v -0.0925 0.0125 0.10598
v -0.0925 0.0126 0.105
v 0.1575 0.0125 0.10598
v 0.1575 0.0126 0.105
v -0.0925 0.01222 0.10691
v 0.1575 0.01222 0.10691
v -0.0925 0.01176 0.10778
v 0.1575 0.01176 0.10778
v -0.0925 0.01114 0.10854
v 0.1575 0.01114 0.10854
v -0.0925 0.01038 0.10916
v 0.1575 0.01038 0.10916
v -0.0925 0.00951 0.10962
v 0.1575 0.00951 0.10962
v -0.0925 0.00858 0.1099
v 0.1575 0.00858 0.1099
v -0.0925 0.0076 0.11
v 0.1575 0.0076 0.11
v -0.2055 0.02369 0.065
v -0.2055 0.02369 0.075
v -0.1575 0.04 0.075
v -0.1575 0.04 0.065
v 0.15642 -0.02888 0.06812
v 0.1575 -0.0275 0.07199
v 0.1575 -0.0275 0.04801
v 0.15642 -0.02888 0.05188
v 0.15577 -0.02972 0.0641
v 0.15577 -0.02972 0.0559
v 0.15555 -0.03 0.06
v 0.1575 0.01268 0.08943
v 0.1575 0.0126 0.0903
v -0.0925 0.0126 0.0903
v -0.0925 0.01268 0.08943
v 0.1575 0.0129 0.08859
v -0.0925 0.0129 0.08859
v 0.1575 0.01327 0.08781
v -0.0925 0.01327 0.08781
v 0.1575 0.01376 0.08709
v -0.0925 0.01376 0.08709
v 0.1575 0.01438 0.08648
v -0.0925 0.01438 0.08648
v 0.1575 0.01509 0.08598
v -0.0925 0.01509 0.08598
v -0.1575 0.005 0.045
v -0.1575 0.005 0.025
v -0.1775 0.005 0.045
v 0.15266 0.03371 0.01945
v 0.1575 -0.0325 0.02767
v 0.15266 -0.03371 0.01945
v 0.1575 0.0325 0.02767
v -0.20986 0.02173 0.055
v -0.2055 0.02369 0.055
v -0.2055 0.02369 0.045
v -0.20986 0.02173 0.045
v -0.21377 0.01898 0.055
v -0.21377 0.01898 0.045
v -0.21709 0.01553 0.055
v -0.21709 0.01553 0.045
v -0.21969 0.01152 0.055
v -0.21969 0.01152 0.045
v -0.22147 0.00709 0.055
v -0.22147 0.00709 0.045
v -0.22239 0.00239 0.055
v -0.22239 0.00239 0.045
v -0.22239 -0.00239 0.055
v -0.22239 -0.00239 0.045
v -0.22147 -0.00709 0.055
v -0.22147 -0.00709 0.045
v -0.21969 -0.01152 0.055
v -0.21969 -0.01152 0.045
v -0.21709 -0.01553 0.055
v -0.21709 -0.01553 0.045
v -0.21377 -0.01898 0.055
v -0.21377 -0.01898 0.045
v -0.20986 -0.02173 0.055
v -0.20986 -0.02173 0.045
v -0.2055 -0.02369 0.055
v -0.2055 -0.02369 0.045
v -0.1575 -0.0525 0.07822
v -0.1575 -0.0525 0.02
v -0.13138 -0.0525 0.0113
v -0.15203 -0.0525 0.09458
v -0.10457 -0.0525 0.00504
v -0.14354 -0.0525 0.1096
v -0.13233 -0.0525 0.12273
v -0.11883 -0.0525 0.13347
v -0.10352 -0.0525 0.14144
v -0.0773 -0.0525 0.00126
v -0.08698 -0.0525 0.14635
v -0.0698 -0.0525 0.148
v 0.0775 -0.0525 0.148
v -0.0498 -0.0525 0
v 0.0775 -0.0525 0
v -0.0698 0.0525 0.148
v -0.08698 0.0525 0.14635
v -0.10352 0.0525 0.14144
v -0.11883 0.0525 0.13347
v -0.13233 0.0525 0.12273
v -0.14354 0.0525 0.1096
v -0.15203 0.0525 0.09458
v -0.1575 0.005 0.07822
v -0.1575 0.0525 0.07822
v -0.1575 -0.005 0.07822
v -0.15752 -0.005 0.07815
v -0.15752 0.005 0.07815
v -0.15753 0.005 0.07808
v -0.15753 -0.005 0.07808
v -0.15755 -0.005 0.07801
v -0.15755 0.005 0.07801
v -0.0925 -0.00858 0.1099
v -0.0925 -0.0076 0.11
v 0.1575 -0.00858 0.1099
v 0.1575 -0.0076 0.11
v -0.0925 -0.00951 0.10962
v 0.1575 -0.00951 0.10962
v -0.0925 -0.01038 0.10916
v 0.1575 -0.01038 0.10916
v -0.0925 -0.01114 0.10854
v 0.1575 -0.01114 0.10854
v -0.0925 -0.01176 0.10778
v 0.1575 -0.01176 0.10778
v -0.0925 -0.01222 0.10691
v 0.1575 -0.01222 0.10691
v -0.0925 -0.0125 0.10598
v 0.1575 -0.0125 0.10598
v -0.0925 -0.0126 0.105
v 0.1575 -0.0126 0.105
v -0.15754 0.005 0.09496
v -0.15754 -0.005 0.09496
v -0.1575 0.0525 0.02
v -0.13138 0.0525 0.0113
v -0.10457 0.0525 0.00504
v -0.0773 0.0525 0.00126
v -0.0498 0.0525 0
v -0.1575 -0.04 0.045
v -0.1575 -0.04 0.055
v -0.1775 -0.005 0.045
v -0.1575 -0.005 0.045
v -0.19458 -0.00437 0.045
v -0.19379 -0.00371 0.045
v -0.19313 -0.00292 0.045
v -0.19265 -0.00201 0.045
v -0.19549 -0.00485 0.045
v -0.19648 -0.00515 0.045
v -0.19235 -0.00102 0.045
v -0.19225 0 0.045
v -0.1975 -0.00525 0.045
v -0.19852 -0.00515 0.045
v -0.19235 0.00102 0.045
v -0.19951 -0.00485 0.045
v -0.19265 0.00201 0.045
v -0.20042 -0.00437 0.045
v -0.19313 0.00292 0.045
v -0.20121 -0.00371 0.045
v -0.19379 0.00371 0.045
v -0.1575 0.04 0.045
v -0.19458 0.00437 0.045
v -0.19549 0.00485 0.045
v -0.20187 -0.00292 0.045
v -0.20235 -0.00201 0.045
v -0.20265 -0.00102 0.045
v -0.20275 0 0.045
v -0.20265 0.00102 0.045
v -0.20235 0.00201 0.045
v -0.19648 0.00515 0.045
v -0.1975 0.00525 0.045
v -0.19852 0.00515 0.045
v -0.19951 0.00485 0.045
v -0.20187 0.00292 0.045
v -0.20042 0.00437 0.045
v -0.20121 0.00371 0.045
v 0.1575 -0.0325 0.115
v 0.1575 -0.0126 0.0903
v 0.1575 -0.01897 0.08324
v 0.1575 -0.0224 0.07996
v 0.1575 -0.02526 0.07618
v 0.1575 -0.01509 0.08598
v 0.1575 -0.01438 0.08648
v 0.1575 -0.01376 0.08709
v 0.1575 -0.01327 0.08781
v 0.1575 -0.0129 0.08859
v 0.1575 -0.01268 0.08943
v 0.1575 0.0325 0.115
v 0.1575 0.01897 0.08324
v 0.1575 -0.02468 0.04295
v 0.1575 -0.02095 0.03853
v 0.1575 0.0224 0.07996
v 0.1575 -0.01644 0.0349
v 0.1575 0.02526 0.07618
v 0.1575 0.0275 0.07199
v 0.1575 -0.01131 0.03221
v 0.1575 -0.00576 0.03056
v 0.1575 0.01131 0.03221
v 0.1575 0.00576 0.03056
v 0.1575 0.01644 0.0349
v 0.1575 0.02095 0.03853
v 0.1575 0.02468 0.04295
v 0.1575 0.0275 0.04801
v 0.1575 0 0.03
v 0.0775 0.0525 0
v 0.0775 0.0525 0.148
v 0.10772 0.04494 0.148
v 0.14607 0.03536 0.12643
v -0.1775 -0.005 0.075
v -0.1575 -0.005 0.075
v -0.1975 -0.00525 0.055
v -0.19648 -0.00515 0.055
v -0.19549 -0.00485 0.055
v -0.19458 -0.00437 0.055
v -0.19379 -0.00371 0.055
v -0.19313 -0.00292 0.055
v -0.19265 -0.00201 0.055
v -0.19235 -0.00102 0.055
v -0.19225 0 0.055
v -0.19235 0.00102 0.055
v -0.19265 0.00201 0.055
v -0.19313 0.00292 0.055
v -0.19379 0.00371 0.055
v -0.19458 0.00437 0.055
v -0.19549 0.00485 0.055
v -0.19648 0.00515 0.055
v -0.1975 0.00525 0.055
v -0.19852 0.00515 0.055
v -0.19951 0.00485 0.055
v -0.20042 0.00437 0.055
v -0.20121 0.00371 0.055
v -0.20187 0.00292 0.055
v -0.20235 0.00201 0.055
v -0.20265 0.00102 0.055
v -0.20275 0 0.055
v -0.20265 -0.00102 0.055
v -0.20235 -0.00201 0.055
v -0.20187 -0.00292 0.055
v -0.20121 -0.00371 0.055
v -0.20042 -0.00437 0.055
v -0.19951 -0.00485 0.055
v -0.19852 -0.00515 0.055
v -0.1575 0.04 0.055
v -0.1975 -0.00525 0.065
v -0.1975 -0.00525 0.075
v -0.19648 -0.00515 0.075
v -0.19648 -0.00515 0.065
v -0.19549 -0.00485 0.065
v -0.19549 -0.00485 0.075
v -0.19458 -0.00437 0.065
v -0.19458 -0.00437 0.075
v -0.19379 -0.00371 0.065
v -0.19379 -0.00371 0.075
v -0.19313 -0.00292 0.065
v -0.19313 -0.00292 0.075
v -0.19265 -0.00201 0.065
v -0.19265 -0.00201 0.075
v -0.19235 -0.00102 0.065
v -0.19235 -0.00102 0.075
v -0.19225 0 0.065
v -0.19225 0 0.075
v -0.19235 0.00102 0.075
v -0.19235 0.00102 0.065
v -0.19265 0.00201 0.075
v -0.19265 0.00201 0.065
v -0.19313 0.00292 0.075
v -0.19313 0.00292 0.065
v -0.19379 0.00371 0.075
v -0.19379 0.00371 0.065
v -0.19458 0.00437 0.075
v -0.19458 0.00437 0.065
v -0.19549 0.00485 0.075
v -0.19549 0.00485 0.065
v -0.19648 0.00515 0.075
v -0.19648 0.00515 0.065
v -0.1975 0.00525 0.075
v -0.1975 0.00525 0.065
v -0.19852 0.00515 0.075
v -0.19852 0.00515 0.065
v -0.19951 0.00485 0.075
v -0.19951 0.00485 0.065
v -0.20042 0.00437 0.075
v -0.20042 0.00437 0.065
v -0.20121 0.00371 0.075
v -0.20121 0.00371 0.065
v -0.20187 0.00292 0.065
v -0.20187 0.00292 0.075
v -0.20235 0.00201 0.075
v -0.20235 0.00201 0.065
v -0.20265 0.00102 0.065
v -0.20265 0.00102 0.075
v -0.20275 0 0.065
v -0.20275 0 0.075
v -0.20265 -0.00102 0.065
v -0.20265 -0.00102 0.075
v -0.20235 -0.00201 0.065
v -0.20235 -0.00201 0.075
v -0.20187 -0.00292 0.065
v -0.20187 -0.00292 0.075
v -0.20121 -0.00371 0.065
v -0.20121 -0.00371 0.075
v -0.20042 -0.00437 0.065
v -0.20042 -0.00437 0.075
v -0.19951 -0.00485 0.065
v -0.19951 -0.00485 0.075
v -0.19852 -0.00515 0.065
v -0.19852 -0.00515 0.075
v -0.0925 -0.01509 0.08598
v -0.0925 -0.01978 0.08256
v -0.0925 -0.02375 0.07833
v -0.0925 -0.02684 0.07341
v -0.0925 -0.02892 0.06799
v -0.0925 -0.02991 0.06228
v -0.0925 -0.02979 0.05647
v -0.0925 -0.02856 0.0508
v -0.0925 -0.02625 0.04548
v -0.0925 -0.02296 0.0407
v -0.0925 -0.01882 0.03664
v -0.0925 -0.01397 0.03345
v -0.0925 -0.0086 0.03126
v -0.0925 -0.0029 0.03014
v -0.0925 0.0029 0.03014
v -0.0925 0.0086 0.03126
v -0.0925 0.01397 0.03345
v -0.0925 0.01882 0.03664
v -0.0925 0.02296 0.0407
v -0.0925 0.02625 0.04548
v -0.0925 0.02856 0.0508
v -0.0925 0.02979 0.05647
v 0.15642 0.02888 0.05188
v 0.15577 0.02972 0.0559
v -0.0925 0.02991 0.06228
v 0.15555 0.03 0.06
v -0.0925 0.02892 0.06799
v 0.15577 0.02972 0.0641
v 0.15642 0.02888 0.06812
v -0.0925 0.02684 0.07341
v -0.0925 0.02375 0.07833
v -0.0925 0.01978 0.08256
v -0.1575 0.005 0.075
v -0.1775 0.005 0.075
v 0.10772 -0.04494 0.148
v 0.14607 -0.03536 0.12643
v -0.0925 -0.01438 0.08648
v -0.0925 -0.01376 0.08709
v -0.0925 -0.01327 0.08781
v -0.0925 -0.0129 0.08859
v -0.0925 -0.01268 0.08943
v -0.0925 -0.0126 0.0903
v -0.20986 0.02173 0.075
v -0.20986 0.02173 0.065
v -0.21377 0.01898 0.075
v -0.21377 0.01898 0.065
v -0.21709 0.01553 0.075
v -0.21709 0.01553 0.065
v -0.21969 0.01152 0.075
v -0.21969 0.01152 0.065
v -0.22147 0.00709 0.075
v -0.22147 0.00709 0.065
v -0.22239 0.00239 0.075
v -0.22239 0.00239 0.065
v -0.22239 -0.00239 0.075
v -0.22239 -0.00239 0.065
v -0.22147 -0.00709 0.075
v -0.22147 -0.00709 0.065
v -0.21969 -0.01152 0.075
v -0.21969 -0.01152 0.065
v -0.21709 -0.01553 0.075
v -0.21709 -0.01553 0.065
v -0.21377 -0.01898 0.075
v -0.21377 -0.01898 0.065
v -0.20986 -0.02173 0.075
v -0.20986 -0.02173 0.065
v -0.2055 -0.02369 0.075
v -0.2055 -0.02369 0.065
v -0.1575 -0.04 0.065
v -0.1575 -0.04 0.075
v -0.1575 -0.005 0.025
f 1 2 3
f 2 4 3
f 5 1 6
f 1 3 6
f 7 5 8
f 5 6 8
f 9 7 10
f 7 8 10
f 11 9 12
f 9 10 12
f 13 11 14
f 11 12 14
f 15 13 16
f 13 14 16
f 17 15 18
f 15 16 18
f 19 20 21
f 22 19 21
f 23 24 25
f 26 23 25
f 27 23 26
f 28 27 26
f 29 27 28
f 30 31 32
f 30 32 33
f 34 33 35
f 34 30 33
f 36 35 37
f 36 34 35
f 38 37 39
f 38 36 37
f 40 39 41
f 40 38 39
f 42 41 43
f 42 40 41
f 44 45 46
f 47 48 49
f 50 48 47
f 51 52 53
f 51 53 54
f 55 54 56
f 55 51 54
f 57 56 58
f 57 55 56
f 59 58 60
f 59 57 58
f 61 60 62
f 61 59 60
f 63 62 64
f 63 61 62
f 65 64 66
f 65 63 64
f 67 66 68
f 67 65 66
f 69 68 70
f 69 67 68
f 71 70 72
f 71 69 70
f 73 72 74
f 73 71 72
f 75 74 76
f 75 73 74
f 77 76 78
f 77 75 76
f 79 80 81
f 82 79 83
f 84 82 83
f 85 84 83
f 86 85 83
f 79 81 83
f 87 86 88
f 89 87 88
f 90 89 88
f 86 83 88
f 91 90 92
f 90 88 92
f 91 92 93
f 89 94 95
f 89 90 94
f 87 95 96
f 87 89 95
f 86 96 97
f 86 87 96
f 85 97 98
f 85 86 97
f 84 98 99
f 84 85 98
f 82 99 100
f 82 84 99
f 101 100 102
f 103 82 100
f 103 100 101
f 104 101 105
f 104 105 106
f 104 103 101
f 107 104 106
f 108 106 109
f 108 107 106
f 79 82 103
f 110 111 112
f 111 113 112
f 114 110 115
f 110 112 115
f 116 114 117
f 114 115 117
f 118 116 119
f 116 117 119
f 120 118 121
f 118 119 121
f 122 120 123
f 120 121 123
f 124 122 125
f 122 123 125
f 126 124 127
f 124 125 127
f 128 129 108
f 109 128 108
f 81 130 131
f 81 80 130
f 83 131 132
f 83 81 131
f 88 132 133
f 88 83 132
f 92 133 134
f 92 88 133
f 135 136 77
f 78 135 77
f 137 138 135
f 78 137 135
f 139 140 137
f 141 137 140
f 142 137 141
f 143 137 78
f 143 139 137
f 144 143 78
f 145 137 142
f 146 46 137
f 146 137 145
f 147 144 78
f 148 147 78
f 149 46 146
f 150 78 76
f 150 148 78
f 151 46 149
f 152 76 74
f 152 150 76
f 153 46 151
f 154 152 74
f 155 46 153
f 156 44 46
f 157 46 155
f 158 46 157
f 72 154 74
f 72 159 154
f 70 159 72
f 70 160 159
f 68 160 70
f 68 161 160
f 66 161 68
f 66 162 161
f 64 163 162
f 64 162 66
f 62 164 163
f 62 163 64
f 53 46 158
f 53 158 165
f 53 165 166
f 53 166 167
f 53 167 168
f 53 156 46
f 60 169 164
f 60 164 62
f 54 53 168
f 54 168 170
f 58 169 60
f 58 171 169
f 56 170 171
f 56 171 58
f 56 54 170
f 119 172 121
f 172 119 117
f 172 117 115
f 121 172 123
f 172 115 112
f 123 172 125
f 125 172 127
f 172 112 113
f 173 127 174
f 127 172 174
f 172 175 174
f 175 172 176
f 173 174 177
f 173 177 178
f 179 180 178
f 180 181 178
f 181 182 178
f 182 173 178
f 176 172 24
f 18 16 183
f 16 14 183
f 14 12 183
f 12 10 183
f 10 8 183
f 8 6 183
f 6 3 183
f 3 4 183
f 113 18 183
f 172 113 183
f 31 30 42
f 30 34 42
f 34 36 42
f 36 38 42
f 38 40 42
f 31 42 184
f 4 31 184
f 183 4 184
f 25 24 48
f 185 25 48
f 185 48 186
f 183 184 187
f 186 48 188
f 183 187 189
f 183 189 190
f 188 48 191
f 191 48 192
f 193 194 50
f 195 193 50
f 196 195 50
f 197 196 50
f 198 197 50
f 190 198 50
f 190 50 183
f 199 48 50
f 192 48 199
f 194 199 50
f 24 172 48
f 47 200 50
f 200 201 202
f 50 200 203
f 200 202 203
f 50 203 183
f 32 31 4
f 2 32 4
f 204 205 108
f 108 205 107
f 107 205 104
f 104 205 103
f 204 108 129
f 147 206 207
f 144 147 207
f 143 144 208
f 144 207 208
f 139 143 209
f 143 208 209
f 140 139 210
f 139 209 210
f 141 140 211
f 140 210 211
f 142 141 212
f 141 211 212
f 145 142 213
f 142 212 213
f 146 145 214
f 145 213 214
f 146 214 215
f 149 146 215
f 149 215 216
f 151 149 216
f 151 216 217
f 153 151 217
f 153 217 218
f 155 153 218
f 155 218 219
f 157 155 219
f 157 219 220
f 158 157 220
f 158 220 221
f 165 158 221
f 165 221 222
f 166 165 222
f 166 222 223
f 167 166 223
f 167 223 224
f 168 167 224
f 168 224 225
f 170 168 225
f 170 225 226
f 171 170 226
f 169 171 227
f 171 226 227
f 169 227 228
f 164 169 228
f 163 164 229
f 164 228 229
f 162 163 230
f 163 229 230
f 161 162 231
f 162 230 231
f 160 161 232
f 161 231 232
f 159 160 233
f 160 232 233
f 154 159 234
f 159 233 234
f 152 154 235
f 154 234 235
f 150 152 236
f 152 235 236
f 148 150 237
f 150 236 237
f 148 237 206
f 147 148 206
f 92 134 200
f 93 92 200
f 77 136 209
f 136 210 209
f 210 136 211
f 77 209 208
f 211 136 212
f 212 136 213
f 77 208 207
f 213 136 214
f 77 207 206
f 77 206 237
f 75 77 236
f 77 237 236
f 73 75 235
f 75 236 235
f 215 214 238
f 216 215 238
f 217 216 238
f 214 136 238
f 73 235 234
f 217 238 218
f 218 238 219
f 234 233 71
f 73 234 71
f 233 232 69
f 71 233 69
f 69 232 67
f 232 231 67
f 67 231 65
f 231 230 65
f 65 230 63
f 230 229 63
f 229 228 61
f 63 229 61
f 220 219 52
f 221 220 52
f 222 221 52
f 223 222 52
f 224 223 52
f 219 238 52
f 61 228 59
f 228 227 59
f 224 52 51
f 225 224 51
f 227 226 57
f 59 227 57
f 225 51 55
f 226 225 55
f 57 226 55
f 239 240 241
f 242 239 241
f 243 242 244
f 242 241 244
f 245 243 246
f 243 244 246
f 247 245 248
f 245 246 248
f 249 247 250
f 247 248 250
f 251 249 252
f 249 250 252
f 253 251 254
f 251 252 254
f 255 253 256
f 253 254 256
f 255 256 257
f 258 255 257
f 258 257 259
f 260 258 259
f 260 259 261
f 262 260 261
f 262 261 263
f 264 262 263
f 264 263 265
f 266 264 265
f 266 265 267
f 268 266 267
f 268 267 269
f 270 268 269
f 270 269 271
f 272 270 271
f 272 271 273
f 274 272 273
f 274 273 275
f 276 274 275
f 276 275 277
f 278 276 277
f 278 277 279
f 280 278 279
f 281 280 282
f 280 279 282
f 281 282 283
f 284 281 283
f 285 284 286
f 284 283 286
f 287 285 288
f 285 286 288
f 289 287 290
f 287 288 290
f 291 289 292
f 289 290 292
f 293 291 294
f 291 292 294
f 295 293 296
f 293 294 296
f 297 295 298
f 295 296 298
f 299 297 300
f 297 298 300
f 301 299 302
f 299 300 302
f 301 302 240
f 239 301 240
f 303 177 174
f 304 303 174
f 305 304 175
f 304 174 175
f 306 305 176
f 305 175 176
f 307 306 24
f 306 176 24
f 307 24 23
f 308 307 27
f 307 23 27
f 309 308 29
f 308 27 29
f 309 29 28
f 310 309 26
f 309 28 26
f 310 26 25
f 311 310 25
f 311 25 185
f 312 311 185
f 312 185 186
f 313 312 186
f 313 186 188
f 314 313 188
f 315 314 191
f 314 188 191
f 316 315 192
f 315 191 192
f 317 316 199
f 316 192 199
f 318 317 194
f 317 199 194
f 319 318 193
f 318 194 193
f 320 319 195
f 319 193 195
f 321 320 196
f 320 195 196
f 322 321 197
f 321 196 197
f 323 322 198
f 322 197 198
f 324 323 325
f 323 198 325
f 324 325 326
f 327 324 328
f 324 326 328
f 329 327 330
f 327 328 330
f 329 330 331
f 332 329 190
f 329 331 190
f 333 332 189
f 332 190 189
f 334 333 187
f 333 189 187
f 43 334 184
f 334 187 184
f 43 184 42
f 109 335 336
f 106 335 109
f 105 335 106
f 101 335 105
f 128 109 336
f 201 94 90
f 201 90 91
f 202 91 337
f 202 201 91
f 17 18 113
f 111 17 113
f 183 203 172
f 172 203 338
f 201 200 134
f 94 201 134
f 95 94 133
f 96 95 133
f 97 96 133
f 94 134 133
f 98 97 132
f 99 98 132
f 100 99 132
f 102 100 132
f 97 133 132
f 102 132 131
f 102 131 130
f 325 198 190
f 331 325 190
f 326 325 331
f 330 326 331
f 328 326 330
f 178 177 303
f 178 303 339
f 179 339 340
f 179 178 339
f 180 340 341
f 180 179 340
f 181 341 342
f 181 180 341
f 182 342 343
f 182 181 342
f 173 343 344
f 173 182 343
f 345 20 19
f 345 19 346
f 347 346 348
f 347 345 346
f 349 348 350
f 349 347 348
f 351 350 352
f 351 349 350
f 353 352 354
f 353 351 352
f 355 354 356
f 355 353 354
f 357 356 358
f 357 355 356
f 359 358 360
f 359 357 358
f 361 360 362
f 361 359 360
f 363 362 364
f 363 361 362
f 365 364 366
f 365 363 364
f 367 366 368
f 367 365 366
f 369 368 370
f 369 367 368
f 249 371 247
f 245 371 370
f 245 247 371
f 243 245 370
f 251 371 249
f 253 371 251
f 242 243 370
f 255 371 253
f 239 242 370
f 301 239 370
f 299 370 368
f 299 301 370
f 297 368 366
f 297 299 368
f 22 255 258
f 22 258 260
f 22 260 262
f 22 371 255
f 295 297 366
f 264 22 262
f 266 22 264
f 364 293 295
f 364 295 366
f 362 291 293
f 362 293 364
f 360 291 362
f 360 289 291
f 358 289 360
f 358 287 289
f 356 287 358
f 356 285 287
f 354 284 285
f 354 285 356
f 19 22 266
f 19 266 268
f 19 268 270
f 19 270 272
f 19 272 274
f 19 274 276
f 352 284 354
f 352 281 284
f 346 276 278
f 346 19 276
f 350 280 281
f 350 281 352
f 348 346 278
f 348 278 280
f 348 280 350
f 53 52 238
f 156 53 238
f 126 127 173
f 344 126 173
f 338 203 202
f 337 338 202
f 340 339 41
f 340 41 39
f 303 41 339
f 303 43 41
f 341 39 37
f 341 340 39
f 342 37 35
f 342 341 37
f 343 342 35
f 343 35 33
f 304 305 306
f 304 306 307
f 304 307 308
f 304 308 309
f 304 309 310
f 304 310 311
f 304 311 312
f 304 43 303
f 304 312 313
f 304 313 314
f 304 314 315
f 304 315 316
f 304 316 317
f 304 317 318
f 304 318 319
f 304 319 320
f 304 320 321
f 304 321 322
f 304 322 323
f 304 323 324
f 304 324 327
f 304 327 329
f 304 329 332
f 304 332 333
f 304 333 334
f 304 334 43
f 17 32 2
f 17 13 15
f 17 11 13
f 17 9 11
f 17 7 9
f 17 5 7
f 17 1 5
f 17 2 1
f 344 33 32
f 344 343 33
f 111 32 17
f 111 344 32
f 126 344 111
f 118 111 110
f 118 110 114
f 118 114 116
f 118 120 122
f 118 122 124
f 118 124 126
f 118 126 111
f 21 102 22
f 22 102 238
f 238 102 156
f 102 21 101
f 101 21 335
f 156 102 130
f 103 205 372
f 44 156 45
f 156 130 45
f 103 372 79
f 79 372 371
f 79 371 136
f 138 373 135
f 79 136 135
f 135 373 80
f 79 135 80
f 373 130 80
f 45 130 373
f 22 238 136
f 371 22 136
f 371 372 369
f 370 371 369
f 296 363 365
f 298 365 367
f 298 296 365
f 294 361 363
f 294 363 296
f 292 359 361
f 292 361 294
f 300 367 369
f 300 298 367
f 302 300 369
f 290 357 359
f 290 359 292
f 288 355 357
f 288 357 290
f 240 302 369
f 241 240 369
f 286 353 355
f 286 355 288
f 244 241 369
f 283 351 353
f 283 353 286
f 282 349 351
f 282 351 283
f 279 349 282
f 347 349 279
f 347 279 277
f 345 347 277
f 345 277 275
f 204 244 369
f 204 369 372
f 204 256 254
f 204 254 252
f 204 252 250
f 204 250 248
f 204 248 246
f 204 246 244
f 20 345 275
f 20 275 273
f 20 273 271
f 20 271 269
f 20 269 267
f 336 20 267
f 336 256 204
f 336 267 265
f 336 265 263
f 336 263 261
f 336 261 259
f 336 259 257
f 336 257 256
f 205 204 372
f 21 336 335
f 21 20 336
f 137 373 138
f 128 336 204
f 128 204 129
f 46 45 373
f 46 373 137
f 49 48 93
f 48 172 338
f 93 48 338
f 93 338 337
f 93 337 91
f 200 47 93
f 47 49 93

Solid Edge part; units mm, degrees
sketch "Sketch1" plane through (0, 0, 0) normal (0, 0, 1) x (1, 0, 0)
  line L0 (-0.1575, -0.0525) -> (0.1575, -0.0525)
  line L1 (0.1575, -0.0525) -> (0.1575, 0.0525)
  line L2 (0.1575, 0.0525) -> (-0.1575, 0.0525)
  line L3 (-0.1575, 0.0525) -> (-0.1575, -0.0525)
  dimension "D1" = 0.105
  dimension "D2" = 0.315
extrude "Protrusion1" add sketch "Sketch1" along normal blind 0.148
sketch "Sketch2" plane through (0.1575, 0, 0.09) normal (1, 0, 0) x (0, 1, 0)
  line L0 (0.0126, 0.0003) -> (0.0126, 0.015)
  arc A0 (0.0076, 0.02) -> (0.0126, 0.015) centre (0.0076, 0.015) cw
  line L1 (0.0076, 0.02) -> (-0.0076, 0.02)
  arc A1 (-0.0076, 0.02) -> (-0.0126, 0.015) centre (-0.0076, 0.015) ccw
  line L2 (-0.0126, 0.015) -> (-0.0126, 0.0003)
  arc A2 (-0.0151, -0.004) -> (-0.0126, 0.0003) centre (-0.0176, 0.0003) ccw
  arc A3 (0.0126, 0.0003) -> (0.0151, -0.004) centre (0.0176, 0.0003) ccw
  arc A4 (-0.0151, -0.004) -> (0.0151, -0.004) centre (0, -0.03) ccw
extrude "Ausschnitt_1" cut sketch "Sketch2" against normal blind 0.25
sketch "Sketch3" plane through (0, 0, 0) normal (0, -1, 0) x (1, 0, 0)
  line L0 (-0.1575, 0.075) -> (-0.1575, 0.045)
  line L1 (-0.1575, 0.045) -> (-0.2225, 0.045)
  line L2 (-0.2225, 0.045) -> (-0.2225, 0.075)
  line L3 (-0.2225, 0.075) -> (-0.1575, 0.075)
  dimension "D1" = 0.06
  dimension "D2" = 0.03
  dimension "D3" = 0.065
extrude "Ausprägung_2" add sketch "Sketch3" along normal mid plane 0.08
sketch "Sketch4" plane through (-0.19, 0, 0.075) normal (0, 0, 1) x (1, 0, 0)
  line L0 (0.0325, -0.04) -> (-0.0325, -0.04)
  line L1 (-0.0325, -0.04) -> (-0.0325, 0)
  line L2 (0.0325, -0.04) -> (-0.0155, -0.0237)
  arc A0 (-0.0325, 0) -> (-0.0155, -0.0237) centre (-0.0075, 0) ccw
extrude "Cutout1" cut sketch "Sketch4" against normal through all
mirror "Mirror1" about plane through (0, 0, 0) normal (0, -1, 0) of "Cutout1"
hole "Bohrung_1" at (-0.1975, 0, 0.075) direction (0, 0, -1) diameter 0.0105 end through all
sketch "Sketch5" plane through (0, 0, 0) normal (0, -1, 0) x (1, 0, 0)
  line L0 (-0.1575, 0.065) -> (-0.1575, 0.055)
  line L1 (-0.1575, 0.055) -> (-0.2225, 0.055)
  line L2 (-0.2225, 0.065) -> (-0.2225, 0.055)
  line L3 (-0.1575, 0.065) -> (-0.2225, 0.065)
  dimension "D1" = 0.015
  dimension "D2" = 0.01
extrude "Cutout3" cut sketch "Sketch5" along normal through all and the other way through all
sketch "Sketch6" plane through (0, 0, 0) normal (0, -1, 0) x (1, 0, 0)
  line L0 (-0.1575, 0.075) -> (-0.1775, 0.075)
  line L1 (-0.1775, 0.075) -> (-0.1575, 0.095)
  line L2 (-0.1575, 0.095) -> (-0.1575, 0.075)
  line L3 (-0.1575, 0.045) -> (-0.1575, 0.025)
  line L4 (-0.1575, 0.025) -> (-0.1775, 0.045)
  line L5 (-0.1775, 0.045) -> (-0.1575, 0.045)
  dimension "D1" = 0.02
extrude "Ausprägung_3" add sketch "Sketch6" along normal mid plane 0.01
sketch "Sketch7" plane through (0, -0.0525, 0.09) normal (0, -1, 0) x (1, 0, 0)
  line L0 (-0.1575, -0.07) -> (-0.1575, -0.09)
  line L1 (-0.1575, -0.09) -> (-0.0498, -0.09)
  arc A0 (-0.0498, -0.09) -> (-0.1575, -0.07) centre (-0.0498, 0.21) cw
  line L2 (-0.1575, 0.058) -> (-0.1575, -0.012)
  arc A1 (-0.1575, -0.012) -> (-0.0698, 0.058) centre (-0.0698, -0.032) cw
  line L3 (-0.0698, 0.058) -> (-0.1575, 0.058)
  dimension "D1" = 0.1575
  dimension "D2" = 0.1575
extrude "Cutout4" cut sketch "Sketch7" against normal through all
sketch "Sketch8" plane through (0, -0.0525, 0.09) normal (0, -1, 0) x (1, 0, 0)
  line L0 (0.1575, -0.0693) -> (0.0775, -0.09)
  line L1 (0.1575, -0.09) -> (0.0775, -0.09)
  line L2 (0.1575, -0.0693) -> (0.1575, -0.09)
  line L3 (0.1575, 0.09) -> (-0.0239, 0.09)
  arc A0 (-0.0239, 0.09) -> (0.0775, 0.075) centre (0.0775, 0.425) ccw
  line L4 (0.1575, 0.03) -> (0.0775, 0.075)
  line L5 (0.1575, 0.09) -> (0.1575, 0.03)
  dimension "D1" = 0.1575
extrude "Cutout5" cut sketch "Sketch8" against normal through all
fillet "Round1" [suppressed]
sketch "Sketch9" plane through (-0.0011, 0, 0.148) normal (0, 0, 1) x (1, 0, 0)
  line L0 (0.1586, -0.0325) -> (0.0786, -0.0525)
  line L1 (0.1586, -0.0525) -> (0.0786, -0.0525)
  line L2 (0.1586, -0.0325) -> (0.1586, -0.0525)
  line L3 (0.0786, 0.0525) -> (0.1586, 0.0325)
  line L4 (0.1586, 0.0525) -> (0.1586, 0.0325)
  line L5 (0.1586, 0.0525) -> (0.0786, 0.0525)
  dimension "D1" = 0.02
extrude "Cutout6" cut sketch "Sketch9" against normal through all
chamfer "Fase_1" [suppressed]
chamfer "Fase_2" distance 0.005 angle 45 4 edges at (0.1575, 0, 0.12) (0.1575, 0.0325, 0.0704) (0.1575, 0, 0.0207) (0.1575, -0.0325, 0.0704)
